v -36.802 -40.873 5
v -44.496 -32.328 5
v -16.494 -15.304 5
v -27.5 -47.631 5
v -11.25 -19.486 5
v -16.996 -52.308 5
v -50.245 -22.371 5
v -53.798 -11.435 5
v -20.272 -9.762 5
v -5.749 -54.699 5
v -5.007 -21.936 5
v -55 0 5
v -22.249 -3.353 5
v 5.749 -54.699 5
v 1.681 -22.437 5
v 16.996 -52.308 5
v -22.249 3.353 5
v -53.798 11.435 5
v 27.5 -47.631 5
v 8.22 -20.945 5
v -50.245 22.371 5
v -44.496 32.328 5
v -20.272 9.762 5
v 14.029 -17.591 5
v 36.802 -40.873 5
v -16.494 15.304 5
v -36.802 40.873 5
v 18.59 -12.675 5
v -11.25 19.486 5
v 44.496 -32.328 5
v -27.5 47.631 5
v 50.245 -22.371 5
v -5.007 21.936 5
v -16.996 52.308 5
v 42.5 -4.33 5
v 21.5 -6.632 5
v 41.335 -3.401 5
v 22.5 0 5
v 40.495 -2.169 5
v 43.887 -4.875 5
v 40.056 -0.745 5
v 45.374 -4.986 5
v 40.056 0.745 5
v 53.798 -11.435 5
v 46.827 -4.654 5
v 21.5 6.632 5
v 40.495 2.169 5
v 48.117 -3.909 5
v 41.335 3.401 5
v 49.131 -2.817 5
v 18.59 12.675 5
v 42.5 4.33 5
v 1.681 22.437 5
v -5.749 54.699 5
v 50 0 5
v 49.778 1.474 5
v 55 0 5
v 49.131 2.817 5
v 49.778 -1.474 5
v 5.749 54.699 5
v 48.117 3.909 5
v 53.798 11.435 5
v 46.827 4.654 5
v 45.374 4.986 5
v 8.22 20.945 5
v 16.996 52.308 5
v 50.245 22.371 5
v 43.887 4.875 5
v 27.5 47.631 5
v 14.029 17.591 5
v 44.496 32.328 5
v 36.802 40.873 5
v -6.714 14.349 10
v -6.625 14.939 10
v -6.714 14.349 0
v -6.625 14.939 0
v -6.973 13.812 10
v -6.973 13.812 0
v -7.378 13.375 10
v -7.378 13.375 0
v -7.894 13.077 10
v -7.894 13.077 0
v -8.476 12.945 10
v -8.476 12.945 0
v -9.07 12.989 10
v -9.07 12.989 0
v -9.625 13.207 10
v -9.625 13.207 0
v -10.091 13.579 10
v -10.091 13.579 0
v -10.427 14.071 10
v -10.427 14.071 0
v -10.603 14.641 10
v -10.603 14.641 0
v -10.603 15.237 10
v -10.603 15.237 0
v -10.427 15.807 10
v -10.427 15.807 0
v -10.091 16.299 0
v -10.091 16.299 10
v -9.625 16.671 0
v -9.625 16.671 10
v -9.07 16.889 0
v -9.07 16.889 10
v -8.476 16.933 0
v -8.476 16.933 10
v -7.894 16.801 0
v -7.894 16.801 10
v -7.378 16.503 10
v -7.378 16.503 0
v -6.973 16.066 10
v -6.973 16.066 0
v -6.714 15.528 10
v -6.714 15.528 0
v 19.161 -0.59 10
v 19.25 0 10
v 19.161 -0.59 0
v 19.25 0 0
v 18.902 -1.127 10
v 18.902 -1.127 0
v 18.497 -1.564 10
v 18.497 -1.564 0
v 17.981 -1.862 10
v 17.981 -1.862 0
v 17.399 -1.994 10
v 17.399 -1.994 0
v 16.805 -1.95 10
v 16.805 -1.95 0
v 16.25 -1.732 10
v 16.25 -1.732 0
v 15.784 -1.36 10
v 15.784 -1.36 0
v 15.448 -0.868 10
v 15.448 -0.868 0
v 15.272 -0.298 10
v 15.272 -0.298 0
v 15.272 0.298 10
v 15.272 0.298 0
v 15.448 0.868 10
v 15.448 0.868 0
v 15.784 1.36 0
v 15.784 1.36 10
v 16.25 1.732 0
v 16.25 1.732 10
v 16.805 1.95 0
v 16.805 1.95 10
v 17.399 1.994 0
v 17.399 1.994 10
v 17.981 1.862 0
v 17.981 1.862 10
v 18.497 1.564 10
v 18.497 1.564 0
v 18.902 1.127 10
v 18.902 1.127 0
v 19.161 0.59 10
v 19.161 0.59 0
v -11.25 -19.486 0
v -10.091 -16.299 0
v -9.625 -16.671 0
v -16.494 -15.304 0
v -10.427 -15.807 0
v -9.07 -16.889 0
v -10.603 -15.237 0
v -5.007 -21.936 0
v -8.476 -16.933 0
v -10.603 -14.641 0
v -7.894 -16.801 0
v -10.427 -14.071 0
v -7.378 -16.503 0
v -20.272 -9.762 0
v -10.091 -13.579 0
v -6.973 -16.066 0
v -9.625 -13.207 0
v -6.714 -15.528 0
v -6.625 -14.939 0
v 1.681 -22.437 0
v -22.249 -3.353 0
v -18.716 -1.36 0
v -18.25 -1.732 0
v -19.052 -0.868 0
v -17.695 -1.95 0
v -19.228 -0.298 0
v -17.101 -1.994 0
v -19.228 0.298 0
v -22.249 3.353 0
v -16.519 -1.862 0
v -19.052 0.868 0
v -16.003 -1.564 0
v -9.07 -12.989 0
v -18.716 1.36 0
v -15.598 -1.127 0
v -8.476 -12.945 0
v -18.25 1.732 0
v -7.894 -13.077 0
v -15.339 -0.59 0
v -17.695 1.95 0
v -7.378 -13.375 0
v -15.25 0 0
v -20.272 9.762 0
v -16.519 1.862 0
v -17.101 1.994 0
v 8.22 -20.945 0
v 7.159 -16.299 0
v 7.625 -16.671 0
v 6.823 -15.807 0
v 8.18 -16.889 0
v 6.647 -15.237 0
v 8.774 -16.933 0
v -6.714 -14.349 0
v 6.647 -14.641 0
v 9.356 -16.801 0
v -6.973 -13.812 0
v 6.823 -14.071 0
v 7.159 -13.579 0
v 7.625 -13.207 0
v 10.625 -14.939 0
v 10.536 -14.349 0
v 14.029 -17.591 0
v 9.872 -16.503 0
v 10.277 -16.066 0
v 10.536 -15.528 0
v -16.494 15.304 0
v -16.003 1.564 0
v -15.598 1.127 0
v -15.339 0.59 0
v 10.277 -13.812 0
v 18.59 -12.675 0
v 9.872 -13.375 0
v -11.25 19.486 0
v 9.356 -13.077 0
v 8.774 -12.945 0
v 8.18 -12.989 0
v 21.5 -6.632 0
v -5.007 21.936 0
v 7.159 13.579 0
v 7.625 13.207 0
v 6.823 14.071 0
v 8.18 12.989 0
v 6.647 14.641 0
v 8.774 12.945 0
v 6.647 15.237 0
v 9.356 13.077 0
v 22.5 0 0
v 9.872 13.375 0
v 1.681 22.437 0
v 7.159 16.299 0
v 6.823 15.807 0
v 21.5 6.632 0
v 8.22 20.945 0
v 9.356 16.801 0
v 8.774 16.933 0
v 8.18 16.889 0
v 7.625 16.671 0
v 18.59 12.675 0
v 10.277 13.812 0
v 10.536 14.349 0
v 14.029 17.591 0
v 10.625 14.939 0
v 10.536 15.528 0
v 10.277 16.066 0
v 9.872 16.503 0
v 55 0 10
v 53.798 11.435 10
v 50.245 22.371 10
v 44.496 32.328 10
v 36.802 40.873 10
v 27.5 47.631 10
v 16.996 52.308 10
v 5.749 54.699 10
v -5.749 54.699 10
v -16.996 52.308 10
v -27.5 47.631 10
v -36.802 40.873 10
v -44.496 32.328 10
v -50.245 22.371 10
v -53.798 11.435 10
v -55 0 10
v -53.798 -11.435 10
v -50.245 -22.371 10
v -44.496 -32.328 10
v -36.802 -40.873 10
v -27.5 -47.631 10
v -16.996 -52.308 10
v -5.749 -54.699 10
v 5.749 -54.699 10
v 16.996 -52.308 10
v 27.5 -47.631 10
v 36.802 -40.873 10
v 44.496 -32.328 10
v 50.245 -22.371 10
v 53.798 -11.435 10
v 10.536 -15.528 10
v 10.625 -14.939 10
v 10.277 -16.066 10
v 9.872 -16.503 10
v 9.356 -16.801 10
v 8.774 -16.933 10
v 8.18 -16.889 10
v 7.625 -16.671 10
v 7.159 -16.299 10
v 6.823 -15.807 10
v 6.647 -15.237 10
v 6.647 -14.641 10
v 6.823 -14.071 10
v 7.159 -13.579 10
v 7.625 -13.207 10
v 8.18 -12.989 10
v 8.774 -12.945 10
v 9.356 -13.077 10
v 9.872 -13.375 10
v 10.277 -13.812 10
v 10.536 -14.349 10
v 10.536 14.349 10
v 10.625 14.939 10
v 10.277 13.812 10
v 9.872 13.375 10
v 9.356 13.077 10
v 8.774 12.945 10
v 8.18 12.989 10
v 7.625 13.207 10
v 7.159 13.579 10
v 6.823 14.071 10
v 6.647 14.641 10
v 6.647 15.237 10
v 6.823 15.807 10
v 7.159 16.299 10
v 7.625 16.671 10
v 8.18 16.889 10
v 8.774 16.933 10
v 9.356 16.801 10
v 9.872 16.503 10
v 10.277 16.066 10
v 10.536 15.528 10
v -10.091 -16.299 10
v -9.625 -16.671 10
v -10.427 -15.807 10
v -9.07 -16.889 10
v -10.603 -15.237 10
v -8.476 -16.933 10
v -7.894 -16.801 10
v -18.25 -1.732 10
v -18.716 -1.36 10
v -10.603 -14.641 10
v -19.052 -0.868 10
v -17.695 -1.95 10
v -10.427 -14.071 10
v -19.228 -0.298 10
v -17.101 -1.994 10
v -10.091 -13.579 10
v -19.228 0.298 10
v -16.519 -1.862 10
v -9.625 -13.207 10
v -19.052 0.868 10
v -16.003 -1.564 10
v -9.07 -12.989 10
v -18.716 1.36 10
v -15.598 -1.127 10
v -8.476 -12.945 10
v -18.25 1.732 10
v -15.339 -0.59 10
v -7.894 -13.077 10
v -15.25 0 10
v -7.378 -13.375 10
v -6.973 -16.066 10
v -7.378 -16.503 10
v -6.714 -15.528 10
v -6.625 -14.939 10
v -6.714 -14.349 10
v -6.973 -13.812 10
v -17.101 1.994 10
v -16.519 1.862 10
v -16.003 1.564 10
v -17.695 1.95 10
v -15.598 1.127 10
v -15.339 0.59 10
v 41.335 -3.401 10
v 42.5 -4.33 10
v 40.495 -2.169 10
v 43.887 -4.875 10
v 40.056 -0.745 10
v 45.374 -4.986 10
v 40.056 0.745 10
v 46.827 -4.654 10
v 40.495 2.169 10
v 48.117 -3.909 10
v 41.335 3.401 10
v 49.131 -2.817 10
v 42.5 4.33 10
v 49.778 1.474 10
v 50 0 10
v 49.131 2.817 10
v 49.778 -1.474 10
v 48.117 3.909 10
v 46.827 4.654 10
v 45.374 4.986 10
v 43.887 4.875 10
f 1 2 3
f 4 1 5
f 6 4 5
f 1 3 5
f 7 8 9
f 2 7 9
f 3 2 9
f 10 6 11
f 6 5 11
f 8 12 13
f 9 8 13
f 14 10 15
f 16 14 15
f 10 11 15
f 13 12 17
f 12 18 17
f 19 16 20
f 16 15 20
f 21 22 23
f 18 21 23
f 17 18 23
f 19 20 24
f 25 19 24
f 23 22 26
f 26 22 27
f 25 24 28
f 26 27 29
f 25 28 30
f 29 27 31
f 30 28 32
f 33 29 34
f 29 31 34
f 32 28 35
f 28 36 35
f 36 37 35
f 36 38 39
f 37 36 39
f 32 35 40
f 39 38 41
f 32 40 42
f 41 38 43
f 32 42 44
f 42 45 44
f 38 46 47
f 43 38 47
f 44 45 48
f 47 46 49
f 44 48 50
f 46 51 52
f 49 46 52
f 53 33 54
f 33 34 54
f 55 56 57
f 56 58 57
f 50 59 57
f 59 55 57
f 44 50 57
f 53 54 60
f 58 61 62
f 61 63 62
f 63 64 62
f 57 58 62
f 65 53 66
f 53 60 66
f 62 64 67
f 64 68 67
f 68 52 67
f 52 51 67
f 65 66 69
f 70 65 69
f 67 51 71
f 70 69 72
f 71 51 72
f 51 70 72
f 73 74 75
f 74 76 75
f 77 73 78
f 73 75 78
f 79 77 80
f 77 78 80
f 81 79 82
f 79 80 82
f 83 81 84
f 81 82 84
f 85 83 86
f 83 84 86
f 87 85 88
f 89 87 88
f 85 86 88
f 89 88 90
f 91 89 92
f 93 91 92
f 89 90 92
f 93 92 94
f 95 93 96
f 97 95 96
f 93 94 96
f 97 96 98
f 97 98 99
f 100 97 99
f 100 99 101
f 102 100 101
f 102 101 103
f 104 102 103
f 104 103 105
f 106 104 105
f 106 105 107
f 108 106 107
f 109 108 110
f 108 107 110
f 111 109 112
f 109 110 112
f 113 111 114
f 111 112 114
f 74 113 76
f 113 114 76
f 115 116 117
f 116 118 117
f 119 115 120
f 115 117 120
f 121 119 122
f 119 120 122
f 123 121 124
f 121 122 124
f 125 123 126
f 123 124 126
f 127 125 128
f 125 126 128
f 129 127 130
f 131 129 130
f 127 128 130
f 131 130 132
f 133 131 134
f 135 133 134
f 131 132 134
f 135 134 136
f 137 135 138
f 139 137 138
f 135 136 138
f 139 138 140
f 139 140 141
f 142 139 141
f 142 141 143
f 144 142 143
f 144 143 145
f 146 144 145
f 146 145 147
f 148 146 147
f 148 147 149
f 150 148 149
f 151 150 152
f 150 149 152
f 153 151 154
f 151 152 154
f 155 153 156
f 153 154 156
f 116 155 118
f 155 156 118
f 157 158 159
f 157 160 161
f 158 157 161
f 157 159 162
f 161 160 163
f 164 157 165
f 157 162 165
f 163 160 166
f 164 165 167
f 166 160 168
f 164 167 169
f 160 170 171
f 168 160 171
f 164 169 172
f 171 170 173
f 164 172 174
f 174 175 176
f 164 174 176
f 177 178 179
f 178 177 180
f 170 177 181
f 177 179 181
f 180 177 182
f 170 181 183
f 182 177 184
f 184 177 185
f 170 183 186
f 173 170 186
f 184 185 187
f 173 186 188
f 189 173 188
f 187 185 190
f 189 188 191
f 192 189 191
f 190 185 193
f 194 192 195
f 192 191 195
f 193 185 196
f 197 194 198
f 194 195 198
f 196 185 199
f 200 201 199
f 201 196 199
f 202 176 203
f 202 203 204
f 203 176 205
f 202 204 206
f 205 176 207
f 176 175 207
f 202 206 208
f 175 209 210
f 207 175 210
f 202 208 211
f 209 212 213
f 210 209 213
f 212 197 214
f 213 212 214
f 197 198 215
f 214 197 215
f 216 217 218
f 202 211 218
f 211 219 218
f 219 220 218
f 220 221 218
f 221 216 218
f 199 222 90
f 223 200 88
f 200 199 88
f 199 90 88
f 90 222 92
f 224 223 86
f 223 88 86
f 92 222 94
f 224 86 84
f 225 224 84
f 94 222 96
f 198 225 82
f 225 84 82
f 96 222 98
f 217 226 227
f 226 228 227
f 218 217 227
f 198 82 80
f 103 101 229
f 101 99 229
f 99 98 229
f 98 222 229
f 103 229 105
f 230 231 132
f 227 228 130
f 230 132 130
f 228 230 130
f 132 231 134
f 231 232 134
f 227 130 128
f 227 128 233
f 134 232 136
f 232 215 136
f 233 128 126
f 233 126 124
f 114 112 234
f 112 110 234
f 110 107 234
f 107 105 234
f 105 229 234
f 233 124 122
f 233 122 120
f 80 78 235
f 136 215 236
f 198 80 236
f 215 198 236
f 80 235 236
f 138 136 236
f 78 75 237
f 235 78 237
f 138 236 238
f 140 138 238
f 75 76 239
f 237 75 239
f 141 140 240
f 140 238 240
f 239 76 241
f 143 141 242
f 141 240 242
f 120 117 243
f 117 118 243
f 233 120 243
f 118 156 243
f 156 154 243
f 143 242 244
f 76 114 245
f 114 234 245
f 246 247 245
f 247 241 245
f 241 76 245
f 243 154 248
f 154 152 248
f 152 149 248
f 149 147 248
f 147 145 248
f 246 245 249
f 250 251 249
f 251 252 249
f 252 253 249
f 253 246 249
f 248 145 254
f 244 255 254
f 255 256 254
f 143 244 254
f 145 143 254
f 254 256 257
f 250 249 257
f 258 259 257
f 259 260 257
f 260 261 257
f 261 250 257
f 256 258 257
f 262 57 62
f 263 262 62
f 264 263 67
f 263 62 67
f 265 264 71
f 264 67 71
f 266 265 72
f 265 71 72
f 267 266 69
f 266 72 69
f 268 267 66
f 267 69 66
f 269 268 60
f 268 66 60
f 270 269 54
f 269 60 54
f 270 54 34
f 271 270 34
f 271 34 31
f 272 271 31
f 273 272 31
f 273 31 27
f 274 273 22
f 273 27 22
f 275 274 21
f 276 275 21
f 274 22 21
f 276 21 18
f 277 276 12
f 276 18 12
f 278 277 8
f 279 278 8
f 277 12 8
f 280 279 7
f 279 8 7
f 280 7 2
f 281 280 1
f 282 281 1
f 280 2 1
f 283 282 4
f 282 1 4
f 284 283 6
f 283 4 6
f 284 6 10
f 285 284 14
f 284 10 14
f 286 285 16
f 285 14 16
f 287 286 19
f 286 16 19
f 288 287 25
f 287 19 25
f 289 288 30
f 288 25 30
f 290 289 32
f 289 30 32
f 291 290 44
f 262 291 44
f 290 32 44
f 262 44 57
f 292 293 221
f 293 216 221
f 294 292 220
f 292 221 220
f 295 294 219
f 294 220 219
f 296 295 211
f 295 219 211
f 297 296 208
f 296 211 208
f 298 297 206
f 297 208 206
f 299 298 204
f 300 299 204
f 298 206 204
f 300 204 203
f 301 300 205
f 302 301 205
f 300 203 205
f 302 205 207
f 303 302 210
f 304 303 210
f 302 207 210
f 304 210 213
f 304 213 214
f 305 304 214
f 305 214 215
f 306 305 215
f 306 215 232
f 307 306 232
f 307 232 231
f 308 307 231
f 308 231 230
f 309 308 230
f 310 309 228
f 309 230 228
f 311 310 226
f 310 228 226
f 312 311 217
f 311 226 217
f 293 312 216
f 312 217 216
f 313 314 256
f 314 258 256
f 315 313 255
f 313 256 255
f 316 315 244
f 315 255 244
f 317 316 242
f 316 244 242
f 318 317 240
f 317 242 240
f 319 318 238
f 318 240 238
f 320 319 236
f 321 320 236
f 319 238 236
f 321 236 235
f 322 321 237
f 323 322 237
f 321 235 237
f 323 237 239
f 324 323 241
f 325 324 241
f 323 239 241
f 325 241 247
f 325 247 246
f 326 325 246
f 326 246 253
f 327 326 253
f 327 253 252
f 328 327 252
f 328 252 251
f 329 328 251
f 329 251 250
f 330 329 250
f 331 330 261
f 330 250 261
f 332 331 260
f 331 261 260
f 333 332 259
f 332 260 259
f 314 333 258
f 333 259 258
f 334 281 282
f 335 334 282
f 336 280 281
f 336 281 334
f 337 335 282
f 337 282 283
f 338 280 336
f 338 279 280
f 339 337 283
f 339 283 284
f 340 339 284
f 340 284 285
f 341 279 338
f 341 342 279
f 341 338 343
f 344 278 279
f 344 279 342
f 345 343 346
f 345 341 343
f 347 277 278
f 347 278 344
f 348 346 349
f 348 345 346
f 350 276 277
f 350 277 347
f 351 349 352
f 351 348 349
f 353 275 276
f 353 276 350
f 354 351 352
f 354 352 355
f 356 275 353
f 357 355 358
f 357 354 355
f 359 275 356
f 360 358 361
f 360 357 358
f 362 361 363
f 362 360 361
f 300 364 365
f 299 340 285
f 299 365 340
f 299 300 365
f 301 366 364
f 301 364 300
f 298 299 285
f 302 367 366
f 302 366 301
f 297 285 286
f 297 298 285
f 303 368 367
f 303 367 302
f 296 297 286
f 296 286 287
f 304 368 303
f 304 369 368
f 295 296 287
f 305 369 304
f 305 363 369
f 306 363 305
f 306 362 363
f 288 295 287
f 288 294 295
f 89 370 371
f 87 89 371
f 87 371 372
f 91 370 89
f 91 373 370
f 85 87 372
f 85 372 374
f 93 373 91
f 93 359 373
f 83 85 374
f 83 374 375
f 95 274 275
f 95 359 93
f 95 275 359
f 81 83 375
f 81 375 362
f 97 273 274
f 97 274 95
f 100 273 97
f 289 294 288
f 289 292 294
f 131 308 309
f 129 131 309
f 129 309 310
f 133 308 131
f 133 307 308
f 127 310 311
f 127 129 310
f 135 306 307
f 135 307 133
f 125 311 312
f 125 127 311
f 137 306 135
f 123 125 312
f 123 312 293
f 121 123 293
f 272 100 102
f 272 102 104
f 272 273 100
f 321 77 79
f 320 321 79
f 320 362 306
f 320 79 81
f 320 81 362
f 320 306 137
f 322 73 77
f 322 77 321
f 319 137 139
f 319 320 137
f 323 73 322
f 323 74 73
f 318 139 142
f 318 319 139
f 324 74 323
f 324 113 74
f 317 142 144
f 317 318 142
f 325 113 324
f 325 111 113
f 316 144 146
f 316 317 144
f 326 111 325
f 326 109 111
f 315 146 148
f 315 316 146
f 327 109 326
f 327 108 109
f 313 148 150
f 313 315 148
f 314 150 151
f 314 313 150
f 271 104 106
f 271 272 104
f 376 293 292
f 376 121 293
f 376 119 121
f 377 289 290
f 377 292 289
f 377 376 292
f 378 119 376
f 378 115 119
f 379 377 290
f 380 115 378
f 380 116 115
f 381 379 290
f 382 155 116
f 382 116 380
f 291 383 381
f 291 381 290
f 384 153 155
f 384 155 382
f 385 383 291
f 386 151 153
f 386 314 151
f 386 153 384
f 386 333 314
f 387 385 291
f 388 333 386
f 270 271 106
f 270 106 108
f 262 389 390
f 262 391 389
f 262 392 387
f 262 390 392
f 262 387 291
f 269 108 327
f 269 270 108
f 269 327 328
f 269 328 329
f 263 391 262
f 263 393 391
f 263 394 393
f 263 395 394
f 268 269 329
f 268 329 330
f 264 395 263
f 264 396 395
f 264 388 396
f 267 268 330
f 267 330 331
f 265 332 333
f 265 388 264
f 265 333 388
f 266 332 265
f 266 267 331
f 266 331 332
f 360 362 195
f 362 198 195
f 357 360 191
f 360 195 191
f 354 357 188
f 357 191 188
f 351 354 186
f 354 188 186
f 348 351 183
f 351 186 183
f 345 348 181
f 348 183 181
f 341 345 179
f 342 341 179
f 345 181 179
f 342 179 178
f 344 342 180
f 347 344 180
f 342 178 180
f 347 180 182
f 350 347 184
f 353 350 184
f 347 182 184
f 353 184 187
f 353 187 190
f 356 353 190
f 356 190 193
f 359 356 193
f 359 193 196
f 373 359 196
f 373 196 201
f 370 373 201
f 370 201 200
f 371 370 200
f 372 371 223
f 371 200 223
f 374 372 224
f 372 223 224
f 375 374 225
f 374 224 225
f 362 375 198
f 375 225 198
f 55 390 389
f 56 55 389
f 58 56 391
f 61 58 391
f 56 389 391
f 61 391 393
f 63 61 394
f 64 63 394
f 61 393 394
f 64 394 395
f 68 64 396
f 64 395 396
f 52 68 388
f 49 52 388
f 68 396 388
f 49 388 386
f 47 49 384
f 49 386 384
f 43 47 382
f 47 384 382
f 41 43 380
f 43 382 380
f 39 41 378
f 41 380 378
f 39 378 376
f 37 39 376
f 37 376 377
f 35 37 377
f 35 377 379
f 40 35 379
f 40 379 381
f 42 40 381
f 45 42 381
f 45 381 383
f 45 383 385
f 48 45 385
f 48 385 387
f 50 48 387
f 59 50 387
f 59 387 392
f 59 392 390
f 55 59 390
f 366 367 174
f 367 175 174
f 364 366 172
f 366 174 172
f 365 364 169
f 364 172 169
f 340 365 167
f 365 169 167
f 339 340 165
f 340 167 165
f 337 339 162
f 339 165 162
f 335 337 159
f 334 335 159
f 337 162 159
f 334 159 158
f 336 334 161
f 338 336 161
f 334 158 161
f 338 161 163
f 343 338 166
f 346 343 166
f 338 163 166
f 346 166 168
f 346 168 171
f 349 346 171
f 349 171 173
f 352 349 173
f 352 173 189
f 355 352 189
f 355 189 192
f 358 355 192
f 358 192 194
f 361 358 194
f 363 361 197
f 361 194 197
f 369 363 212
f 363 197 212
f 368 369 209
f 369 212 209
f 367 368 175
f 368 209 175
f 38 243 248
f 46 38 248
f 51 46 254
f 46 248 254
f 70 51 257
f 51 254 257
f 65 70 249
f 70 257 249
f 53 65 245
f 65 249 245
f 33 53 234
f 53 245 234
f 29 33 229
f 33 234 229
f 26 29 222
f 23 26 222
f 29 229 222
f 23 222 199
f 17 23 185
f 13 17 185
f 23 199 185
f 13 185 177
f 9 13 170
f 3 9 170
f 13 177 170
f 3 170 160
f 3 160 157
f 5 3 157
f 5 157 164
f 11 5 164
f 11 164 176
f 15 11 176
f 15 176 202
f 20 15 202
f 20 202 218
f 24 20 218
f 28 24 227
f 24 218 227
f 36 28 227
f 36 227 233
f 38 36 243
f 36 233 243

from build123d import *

# Parameters (mm, degrees)
SKETCH_1_R          = 22.5
EXTRUDE_1_DEPTH     = 5
SKETCH_2_R          = 2
CUT_EXTRUDE_1_DEPTH = 33.210246817
SKETCH_3_R          = 55
EXTRUDE_2_DEPTH     = 5
SKETCH_4_R          = 5
CUT_EXTRUDE_2_DEPTH = 79.421935707
SKETCH_5_R          = 2
CUT_EXTRUDE_3_DEPTH = 78.942286341


with BuildPart() as part:
    # 草图1 → 凸台-拉伸1 (new body)
    with BuildSketch(Plane.XY):
        Circle(SKETCH_1_R)
    extrude(amount=EXTRUDE_1_DEPTH)

    # 草图2 → 切除-拉伸1 (cut, through all)
    with BuildSketch(Plane.XY.offset(5)):
        with Locations((17.25, 0)):
            Circle(SKETCH_2_R)
        with Locations((8.625, -14.938938215)):
            Circle(SKETCH_2_R)
        with Locations((-8.625, -14.938938215)):
            Circle(SKETCH_2_R)
        with Locations((-17.25, 0)):
            Circle(SKETCH_2_R)
        with Locations((-8.625, 14.938938215)):
            Circle(SKETCH_2_R)
        with Locations((8.625, 14.938938215)):
            Circle(SKETCH_2_R)
    extrude(amount=-CUT_EXTRUDE_1_DEPTH, mode=Mode.SUBTRACT)

    # 草图3 → 凸台-拉伸2 (add)
    with BuildSketch(Plane.XY.offset(5)):
        Circle(SKETCH_3_R)
    extrude(amount=EXTRUDE_2_DEPTH)

    # 草图4 → 切除-拉伸2 (cut, through all)
    with BuildSketch(Plane.XY.offset(10)):
        with Locations((45, 0)):
            Circle(SKETCH_4_R)
    extrude(amount=-CUT_EXTRUDE_2_DEPTH, mode=Mode.SUBTRACT)

    # 草图5 → 切除-拉伸3 (cut, through all)
    with BuildSketch(Plane(origin=(0, 0, 5), x_dir=(-1, 0, 0), z_dir=(0, 0, -1))):
        with Locations(Location((-8.625, 14.938938215, 0), (0, 0, 180))):
            Circle(SKETCH_5_R)
        with Locations(Location((-17.25, 0, 0), (0, 0, 180))):
            Circle(SKETCH_5_R)
        with Locations(Location((-8.625, -14.938938215, 0), (0, 0, 180))):
            Circle(SKETCH_5_R)
        with Locations(Location((8.625, -14.938938215, 0), (0, 0, 180))):
            Circle(SKETCH_5_R)
        with Locations(Location((17.25, 0, 0), (0, 0, 180))):
            Circle(SKETCH_5_R)
        with Locations(Location((8.625, 14.938938215, 0), (0, 0, 180))):
            Circle(SKETCH_5_R)
    extrude(amount=-CUT_EXTRUDE_3_DEPTH, mode=Mode.SUBTRACT)


solid = part.part
